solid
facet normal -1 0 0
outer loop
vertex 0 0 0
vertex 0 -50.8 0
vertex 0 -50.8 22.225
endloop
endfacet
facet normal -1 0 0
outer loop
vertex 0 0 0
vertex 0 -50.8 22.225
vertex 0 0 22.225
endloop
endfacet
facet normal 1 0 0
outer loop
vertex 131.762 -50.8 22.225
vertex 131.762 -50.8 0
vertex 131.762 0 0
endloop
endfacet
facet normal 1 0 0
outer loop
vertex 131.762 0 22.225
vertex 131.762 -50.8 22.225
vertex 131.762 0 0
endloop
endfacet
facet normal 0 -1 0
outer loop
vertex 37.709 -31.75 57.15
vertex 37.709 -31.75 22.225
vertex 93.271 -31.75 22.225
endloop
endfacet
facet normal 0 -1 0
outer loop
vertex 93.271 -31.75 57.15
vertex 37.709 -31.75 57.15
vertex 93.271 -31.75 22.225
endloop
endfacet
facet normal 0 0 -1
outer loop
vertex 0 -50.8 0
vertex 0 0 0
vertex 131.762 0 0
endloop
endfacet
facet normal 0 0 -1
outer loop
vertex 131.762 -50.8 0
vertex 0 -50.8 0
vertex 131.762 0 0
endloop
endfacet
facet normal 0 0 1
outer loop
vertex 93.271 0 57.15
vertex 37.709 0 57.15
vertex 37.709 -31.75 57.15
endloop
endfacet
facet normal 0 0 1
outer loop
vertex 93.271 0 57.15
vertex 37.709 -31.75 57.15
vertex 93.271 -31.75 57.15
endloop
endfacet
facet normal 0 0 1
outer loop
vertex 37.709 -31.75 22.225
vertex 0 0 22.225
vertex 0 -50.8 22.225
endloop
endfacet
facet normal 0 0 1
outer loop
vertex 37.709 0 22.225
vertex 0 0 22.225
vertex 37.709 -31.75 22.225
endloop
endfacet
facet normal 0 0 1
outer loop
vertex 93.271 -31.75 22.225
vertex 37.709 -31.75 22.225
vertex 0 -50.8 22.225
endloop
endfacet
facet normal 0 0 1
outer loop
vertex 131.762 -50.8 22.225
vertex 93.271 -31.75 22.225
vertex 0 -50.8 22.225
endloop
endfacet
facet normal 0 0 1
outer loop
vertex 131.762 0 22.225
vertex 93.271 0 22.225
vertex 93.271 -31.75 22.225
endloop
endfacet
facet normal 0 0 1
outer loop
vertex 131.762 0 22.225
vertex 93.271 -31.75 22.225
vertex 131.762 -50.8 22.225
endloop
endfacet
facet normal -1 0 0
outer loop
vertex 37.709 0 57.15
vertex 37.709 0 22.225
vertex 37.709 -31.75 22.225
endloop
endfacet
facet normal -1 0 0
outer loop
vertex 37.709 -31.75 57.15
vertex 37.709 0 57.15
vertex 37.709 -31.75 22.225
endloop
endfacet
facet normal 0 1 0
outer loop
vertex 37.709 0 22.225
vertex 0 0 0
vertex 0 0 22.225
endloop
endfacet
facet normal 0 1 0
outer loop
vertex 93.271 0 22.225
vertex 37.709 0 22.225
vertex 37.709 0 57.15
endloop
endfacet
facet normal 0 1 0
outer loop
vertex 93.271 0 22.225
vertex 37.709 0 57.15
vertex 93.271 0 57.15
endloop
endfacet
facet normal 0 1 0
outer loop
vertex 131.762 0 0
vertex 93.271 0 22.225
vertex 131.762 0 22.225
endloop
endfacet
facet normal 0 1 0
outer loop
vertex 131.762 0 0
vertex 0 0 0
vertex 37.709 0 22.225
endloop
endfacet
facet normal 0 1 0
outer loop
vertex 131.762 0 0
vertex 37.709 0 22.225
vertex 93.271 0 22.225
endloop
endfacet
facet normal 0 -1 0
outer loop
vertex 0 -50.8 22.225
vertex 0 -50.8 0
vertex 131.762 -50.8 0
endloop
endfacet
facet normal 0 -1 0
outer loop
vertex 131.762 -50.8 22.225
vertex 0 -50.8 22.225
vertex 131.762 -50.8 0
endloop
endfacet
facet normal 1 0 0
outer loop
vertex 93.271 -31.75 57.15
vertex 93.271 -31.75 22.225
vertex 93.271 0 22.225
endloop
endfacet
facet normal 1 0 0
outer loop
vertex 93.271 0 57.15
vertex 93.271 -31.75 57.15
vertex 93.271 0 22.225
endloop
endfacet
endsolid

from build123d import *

# Parameters (mm, degrees)
F0_W     = 131.7625
F0_H     = 50.8
F1_DEPTH = 22.225
F3_DEPTH = 34.925


with BuildPart() as f1:
    # F0 (on Top) → F1 (new body)
    with BuildSketch(Plane.XY):
        with Locations((65.88125, -25.4)):
            Rectangle(F0_W, F0_H)
    extrude(amount=F1_DEPTH)

    # F2 (on face) → F3 (join)
    with BuildSketch(Plane.XY.offset(22.225)):
        Polygon((93.271066, 0), (37.708566, 0), (37.708566, -25.4), (37.708566, -31.75), (93.271066, -31.75), align=None)
    extrude(amount=F3_DEPTH)


solid = f1.part
